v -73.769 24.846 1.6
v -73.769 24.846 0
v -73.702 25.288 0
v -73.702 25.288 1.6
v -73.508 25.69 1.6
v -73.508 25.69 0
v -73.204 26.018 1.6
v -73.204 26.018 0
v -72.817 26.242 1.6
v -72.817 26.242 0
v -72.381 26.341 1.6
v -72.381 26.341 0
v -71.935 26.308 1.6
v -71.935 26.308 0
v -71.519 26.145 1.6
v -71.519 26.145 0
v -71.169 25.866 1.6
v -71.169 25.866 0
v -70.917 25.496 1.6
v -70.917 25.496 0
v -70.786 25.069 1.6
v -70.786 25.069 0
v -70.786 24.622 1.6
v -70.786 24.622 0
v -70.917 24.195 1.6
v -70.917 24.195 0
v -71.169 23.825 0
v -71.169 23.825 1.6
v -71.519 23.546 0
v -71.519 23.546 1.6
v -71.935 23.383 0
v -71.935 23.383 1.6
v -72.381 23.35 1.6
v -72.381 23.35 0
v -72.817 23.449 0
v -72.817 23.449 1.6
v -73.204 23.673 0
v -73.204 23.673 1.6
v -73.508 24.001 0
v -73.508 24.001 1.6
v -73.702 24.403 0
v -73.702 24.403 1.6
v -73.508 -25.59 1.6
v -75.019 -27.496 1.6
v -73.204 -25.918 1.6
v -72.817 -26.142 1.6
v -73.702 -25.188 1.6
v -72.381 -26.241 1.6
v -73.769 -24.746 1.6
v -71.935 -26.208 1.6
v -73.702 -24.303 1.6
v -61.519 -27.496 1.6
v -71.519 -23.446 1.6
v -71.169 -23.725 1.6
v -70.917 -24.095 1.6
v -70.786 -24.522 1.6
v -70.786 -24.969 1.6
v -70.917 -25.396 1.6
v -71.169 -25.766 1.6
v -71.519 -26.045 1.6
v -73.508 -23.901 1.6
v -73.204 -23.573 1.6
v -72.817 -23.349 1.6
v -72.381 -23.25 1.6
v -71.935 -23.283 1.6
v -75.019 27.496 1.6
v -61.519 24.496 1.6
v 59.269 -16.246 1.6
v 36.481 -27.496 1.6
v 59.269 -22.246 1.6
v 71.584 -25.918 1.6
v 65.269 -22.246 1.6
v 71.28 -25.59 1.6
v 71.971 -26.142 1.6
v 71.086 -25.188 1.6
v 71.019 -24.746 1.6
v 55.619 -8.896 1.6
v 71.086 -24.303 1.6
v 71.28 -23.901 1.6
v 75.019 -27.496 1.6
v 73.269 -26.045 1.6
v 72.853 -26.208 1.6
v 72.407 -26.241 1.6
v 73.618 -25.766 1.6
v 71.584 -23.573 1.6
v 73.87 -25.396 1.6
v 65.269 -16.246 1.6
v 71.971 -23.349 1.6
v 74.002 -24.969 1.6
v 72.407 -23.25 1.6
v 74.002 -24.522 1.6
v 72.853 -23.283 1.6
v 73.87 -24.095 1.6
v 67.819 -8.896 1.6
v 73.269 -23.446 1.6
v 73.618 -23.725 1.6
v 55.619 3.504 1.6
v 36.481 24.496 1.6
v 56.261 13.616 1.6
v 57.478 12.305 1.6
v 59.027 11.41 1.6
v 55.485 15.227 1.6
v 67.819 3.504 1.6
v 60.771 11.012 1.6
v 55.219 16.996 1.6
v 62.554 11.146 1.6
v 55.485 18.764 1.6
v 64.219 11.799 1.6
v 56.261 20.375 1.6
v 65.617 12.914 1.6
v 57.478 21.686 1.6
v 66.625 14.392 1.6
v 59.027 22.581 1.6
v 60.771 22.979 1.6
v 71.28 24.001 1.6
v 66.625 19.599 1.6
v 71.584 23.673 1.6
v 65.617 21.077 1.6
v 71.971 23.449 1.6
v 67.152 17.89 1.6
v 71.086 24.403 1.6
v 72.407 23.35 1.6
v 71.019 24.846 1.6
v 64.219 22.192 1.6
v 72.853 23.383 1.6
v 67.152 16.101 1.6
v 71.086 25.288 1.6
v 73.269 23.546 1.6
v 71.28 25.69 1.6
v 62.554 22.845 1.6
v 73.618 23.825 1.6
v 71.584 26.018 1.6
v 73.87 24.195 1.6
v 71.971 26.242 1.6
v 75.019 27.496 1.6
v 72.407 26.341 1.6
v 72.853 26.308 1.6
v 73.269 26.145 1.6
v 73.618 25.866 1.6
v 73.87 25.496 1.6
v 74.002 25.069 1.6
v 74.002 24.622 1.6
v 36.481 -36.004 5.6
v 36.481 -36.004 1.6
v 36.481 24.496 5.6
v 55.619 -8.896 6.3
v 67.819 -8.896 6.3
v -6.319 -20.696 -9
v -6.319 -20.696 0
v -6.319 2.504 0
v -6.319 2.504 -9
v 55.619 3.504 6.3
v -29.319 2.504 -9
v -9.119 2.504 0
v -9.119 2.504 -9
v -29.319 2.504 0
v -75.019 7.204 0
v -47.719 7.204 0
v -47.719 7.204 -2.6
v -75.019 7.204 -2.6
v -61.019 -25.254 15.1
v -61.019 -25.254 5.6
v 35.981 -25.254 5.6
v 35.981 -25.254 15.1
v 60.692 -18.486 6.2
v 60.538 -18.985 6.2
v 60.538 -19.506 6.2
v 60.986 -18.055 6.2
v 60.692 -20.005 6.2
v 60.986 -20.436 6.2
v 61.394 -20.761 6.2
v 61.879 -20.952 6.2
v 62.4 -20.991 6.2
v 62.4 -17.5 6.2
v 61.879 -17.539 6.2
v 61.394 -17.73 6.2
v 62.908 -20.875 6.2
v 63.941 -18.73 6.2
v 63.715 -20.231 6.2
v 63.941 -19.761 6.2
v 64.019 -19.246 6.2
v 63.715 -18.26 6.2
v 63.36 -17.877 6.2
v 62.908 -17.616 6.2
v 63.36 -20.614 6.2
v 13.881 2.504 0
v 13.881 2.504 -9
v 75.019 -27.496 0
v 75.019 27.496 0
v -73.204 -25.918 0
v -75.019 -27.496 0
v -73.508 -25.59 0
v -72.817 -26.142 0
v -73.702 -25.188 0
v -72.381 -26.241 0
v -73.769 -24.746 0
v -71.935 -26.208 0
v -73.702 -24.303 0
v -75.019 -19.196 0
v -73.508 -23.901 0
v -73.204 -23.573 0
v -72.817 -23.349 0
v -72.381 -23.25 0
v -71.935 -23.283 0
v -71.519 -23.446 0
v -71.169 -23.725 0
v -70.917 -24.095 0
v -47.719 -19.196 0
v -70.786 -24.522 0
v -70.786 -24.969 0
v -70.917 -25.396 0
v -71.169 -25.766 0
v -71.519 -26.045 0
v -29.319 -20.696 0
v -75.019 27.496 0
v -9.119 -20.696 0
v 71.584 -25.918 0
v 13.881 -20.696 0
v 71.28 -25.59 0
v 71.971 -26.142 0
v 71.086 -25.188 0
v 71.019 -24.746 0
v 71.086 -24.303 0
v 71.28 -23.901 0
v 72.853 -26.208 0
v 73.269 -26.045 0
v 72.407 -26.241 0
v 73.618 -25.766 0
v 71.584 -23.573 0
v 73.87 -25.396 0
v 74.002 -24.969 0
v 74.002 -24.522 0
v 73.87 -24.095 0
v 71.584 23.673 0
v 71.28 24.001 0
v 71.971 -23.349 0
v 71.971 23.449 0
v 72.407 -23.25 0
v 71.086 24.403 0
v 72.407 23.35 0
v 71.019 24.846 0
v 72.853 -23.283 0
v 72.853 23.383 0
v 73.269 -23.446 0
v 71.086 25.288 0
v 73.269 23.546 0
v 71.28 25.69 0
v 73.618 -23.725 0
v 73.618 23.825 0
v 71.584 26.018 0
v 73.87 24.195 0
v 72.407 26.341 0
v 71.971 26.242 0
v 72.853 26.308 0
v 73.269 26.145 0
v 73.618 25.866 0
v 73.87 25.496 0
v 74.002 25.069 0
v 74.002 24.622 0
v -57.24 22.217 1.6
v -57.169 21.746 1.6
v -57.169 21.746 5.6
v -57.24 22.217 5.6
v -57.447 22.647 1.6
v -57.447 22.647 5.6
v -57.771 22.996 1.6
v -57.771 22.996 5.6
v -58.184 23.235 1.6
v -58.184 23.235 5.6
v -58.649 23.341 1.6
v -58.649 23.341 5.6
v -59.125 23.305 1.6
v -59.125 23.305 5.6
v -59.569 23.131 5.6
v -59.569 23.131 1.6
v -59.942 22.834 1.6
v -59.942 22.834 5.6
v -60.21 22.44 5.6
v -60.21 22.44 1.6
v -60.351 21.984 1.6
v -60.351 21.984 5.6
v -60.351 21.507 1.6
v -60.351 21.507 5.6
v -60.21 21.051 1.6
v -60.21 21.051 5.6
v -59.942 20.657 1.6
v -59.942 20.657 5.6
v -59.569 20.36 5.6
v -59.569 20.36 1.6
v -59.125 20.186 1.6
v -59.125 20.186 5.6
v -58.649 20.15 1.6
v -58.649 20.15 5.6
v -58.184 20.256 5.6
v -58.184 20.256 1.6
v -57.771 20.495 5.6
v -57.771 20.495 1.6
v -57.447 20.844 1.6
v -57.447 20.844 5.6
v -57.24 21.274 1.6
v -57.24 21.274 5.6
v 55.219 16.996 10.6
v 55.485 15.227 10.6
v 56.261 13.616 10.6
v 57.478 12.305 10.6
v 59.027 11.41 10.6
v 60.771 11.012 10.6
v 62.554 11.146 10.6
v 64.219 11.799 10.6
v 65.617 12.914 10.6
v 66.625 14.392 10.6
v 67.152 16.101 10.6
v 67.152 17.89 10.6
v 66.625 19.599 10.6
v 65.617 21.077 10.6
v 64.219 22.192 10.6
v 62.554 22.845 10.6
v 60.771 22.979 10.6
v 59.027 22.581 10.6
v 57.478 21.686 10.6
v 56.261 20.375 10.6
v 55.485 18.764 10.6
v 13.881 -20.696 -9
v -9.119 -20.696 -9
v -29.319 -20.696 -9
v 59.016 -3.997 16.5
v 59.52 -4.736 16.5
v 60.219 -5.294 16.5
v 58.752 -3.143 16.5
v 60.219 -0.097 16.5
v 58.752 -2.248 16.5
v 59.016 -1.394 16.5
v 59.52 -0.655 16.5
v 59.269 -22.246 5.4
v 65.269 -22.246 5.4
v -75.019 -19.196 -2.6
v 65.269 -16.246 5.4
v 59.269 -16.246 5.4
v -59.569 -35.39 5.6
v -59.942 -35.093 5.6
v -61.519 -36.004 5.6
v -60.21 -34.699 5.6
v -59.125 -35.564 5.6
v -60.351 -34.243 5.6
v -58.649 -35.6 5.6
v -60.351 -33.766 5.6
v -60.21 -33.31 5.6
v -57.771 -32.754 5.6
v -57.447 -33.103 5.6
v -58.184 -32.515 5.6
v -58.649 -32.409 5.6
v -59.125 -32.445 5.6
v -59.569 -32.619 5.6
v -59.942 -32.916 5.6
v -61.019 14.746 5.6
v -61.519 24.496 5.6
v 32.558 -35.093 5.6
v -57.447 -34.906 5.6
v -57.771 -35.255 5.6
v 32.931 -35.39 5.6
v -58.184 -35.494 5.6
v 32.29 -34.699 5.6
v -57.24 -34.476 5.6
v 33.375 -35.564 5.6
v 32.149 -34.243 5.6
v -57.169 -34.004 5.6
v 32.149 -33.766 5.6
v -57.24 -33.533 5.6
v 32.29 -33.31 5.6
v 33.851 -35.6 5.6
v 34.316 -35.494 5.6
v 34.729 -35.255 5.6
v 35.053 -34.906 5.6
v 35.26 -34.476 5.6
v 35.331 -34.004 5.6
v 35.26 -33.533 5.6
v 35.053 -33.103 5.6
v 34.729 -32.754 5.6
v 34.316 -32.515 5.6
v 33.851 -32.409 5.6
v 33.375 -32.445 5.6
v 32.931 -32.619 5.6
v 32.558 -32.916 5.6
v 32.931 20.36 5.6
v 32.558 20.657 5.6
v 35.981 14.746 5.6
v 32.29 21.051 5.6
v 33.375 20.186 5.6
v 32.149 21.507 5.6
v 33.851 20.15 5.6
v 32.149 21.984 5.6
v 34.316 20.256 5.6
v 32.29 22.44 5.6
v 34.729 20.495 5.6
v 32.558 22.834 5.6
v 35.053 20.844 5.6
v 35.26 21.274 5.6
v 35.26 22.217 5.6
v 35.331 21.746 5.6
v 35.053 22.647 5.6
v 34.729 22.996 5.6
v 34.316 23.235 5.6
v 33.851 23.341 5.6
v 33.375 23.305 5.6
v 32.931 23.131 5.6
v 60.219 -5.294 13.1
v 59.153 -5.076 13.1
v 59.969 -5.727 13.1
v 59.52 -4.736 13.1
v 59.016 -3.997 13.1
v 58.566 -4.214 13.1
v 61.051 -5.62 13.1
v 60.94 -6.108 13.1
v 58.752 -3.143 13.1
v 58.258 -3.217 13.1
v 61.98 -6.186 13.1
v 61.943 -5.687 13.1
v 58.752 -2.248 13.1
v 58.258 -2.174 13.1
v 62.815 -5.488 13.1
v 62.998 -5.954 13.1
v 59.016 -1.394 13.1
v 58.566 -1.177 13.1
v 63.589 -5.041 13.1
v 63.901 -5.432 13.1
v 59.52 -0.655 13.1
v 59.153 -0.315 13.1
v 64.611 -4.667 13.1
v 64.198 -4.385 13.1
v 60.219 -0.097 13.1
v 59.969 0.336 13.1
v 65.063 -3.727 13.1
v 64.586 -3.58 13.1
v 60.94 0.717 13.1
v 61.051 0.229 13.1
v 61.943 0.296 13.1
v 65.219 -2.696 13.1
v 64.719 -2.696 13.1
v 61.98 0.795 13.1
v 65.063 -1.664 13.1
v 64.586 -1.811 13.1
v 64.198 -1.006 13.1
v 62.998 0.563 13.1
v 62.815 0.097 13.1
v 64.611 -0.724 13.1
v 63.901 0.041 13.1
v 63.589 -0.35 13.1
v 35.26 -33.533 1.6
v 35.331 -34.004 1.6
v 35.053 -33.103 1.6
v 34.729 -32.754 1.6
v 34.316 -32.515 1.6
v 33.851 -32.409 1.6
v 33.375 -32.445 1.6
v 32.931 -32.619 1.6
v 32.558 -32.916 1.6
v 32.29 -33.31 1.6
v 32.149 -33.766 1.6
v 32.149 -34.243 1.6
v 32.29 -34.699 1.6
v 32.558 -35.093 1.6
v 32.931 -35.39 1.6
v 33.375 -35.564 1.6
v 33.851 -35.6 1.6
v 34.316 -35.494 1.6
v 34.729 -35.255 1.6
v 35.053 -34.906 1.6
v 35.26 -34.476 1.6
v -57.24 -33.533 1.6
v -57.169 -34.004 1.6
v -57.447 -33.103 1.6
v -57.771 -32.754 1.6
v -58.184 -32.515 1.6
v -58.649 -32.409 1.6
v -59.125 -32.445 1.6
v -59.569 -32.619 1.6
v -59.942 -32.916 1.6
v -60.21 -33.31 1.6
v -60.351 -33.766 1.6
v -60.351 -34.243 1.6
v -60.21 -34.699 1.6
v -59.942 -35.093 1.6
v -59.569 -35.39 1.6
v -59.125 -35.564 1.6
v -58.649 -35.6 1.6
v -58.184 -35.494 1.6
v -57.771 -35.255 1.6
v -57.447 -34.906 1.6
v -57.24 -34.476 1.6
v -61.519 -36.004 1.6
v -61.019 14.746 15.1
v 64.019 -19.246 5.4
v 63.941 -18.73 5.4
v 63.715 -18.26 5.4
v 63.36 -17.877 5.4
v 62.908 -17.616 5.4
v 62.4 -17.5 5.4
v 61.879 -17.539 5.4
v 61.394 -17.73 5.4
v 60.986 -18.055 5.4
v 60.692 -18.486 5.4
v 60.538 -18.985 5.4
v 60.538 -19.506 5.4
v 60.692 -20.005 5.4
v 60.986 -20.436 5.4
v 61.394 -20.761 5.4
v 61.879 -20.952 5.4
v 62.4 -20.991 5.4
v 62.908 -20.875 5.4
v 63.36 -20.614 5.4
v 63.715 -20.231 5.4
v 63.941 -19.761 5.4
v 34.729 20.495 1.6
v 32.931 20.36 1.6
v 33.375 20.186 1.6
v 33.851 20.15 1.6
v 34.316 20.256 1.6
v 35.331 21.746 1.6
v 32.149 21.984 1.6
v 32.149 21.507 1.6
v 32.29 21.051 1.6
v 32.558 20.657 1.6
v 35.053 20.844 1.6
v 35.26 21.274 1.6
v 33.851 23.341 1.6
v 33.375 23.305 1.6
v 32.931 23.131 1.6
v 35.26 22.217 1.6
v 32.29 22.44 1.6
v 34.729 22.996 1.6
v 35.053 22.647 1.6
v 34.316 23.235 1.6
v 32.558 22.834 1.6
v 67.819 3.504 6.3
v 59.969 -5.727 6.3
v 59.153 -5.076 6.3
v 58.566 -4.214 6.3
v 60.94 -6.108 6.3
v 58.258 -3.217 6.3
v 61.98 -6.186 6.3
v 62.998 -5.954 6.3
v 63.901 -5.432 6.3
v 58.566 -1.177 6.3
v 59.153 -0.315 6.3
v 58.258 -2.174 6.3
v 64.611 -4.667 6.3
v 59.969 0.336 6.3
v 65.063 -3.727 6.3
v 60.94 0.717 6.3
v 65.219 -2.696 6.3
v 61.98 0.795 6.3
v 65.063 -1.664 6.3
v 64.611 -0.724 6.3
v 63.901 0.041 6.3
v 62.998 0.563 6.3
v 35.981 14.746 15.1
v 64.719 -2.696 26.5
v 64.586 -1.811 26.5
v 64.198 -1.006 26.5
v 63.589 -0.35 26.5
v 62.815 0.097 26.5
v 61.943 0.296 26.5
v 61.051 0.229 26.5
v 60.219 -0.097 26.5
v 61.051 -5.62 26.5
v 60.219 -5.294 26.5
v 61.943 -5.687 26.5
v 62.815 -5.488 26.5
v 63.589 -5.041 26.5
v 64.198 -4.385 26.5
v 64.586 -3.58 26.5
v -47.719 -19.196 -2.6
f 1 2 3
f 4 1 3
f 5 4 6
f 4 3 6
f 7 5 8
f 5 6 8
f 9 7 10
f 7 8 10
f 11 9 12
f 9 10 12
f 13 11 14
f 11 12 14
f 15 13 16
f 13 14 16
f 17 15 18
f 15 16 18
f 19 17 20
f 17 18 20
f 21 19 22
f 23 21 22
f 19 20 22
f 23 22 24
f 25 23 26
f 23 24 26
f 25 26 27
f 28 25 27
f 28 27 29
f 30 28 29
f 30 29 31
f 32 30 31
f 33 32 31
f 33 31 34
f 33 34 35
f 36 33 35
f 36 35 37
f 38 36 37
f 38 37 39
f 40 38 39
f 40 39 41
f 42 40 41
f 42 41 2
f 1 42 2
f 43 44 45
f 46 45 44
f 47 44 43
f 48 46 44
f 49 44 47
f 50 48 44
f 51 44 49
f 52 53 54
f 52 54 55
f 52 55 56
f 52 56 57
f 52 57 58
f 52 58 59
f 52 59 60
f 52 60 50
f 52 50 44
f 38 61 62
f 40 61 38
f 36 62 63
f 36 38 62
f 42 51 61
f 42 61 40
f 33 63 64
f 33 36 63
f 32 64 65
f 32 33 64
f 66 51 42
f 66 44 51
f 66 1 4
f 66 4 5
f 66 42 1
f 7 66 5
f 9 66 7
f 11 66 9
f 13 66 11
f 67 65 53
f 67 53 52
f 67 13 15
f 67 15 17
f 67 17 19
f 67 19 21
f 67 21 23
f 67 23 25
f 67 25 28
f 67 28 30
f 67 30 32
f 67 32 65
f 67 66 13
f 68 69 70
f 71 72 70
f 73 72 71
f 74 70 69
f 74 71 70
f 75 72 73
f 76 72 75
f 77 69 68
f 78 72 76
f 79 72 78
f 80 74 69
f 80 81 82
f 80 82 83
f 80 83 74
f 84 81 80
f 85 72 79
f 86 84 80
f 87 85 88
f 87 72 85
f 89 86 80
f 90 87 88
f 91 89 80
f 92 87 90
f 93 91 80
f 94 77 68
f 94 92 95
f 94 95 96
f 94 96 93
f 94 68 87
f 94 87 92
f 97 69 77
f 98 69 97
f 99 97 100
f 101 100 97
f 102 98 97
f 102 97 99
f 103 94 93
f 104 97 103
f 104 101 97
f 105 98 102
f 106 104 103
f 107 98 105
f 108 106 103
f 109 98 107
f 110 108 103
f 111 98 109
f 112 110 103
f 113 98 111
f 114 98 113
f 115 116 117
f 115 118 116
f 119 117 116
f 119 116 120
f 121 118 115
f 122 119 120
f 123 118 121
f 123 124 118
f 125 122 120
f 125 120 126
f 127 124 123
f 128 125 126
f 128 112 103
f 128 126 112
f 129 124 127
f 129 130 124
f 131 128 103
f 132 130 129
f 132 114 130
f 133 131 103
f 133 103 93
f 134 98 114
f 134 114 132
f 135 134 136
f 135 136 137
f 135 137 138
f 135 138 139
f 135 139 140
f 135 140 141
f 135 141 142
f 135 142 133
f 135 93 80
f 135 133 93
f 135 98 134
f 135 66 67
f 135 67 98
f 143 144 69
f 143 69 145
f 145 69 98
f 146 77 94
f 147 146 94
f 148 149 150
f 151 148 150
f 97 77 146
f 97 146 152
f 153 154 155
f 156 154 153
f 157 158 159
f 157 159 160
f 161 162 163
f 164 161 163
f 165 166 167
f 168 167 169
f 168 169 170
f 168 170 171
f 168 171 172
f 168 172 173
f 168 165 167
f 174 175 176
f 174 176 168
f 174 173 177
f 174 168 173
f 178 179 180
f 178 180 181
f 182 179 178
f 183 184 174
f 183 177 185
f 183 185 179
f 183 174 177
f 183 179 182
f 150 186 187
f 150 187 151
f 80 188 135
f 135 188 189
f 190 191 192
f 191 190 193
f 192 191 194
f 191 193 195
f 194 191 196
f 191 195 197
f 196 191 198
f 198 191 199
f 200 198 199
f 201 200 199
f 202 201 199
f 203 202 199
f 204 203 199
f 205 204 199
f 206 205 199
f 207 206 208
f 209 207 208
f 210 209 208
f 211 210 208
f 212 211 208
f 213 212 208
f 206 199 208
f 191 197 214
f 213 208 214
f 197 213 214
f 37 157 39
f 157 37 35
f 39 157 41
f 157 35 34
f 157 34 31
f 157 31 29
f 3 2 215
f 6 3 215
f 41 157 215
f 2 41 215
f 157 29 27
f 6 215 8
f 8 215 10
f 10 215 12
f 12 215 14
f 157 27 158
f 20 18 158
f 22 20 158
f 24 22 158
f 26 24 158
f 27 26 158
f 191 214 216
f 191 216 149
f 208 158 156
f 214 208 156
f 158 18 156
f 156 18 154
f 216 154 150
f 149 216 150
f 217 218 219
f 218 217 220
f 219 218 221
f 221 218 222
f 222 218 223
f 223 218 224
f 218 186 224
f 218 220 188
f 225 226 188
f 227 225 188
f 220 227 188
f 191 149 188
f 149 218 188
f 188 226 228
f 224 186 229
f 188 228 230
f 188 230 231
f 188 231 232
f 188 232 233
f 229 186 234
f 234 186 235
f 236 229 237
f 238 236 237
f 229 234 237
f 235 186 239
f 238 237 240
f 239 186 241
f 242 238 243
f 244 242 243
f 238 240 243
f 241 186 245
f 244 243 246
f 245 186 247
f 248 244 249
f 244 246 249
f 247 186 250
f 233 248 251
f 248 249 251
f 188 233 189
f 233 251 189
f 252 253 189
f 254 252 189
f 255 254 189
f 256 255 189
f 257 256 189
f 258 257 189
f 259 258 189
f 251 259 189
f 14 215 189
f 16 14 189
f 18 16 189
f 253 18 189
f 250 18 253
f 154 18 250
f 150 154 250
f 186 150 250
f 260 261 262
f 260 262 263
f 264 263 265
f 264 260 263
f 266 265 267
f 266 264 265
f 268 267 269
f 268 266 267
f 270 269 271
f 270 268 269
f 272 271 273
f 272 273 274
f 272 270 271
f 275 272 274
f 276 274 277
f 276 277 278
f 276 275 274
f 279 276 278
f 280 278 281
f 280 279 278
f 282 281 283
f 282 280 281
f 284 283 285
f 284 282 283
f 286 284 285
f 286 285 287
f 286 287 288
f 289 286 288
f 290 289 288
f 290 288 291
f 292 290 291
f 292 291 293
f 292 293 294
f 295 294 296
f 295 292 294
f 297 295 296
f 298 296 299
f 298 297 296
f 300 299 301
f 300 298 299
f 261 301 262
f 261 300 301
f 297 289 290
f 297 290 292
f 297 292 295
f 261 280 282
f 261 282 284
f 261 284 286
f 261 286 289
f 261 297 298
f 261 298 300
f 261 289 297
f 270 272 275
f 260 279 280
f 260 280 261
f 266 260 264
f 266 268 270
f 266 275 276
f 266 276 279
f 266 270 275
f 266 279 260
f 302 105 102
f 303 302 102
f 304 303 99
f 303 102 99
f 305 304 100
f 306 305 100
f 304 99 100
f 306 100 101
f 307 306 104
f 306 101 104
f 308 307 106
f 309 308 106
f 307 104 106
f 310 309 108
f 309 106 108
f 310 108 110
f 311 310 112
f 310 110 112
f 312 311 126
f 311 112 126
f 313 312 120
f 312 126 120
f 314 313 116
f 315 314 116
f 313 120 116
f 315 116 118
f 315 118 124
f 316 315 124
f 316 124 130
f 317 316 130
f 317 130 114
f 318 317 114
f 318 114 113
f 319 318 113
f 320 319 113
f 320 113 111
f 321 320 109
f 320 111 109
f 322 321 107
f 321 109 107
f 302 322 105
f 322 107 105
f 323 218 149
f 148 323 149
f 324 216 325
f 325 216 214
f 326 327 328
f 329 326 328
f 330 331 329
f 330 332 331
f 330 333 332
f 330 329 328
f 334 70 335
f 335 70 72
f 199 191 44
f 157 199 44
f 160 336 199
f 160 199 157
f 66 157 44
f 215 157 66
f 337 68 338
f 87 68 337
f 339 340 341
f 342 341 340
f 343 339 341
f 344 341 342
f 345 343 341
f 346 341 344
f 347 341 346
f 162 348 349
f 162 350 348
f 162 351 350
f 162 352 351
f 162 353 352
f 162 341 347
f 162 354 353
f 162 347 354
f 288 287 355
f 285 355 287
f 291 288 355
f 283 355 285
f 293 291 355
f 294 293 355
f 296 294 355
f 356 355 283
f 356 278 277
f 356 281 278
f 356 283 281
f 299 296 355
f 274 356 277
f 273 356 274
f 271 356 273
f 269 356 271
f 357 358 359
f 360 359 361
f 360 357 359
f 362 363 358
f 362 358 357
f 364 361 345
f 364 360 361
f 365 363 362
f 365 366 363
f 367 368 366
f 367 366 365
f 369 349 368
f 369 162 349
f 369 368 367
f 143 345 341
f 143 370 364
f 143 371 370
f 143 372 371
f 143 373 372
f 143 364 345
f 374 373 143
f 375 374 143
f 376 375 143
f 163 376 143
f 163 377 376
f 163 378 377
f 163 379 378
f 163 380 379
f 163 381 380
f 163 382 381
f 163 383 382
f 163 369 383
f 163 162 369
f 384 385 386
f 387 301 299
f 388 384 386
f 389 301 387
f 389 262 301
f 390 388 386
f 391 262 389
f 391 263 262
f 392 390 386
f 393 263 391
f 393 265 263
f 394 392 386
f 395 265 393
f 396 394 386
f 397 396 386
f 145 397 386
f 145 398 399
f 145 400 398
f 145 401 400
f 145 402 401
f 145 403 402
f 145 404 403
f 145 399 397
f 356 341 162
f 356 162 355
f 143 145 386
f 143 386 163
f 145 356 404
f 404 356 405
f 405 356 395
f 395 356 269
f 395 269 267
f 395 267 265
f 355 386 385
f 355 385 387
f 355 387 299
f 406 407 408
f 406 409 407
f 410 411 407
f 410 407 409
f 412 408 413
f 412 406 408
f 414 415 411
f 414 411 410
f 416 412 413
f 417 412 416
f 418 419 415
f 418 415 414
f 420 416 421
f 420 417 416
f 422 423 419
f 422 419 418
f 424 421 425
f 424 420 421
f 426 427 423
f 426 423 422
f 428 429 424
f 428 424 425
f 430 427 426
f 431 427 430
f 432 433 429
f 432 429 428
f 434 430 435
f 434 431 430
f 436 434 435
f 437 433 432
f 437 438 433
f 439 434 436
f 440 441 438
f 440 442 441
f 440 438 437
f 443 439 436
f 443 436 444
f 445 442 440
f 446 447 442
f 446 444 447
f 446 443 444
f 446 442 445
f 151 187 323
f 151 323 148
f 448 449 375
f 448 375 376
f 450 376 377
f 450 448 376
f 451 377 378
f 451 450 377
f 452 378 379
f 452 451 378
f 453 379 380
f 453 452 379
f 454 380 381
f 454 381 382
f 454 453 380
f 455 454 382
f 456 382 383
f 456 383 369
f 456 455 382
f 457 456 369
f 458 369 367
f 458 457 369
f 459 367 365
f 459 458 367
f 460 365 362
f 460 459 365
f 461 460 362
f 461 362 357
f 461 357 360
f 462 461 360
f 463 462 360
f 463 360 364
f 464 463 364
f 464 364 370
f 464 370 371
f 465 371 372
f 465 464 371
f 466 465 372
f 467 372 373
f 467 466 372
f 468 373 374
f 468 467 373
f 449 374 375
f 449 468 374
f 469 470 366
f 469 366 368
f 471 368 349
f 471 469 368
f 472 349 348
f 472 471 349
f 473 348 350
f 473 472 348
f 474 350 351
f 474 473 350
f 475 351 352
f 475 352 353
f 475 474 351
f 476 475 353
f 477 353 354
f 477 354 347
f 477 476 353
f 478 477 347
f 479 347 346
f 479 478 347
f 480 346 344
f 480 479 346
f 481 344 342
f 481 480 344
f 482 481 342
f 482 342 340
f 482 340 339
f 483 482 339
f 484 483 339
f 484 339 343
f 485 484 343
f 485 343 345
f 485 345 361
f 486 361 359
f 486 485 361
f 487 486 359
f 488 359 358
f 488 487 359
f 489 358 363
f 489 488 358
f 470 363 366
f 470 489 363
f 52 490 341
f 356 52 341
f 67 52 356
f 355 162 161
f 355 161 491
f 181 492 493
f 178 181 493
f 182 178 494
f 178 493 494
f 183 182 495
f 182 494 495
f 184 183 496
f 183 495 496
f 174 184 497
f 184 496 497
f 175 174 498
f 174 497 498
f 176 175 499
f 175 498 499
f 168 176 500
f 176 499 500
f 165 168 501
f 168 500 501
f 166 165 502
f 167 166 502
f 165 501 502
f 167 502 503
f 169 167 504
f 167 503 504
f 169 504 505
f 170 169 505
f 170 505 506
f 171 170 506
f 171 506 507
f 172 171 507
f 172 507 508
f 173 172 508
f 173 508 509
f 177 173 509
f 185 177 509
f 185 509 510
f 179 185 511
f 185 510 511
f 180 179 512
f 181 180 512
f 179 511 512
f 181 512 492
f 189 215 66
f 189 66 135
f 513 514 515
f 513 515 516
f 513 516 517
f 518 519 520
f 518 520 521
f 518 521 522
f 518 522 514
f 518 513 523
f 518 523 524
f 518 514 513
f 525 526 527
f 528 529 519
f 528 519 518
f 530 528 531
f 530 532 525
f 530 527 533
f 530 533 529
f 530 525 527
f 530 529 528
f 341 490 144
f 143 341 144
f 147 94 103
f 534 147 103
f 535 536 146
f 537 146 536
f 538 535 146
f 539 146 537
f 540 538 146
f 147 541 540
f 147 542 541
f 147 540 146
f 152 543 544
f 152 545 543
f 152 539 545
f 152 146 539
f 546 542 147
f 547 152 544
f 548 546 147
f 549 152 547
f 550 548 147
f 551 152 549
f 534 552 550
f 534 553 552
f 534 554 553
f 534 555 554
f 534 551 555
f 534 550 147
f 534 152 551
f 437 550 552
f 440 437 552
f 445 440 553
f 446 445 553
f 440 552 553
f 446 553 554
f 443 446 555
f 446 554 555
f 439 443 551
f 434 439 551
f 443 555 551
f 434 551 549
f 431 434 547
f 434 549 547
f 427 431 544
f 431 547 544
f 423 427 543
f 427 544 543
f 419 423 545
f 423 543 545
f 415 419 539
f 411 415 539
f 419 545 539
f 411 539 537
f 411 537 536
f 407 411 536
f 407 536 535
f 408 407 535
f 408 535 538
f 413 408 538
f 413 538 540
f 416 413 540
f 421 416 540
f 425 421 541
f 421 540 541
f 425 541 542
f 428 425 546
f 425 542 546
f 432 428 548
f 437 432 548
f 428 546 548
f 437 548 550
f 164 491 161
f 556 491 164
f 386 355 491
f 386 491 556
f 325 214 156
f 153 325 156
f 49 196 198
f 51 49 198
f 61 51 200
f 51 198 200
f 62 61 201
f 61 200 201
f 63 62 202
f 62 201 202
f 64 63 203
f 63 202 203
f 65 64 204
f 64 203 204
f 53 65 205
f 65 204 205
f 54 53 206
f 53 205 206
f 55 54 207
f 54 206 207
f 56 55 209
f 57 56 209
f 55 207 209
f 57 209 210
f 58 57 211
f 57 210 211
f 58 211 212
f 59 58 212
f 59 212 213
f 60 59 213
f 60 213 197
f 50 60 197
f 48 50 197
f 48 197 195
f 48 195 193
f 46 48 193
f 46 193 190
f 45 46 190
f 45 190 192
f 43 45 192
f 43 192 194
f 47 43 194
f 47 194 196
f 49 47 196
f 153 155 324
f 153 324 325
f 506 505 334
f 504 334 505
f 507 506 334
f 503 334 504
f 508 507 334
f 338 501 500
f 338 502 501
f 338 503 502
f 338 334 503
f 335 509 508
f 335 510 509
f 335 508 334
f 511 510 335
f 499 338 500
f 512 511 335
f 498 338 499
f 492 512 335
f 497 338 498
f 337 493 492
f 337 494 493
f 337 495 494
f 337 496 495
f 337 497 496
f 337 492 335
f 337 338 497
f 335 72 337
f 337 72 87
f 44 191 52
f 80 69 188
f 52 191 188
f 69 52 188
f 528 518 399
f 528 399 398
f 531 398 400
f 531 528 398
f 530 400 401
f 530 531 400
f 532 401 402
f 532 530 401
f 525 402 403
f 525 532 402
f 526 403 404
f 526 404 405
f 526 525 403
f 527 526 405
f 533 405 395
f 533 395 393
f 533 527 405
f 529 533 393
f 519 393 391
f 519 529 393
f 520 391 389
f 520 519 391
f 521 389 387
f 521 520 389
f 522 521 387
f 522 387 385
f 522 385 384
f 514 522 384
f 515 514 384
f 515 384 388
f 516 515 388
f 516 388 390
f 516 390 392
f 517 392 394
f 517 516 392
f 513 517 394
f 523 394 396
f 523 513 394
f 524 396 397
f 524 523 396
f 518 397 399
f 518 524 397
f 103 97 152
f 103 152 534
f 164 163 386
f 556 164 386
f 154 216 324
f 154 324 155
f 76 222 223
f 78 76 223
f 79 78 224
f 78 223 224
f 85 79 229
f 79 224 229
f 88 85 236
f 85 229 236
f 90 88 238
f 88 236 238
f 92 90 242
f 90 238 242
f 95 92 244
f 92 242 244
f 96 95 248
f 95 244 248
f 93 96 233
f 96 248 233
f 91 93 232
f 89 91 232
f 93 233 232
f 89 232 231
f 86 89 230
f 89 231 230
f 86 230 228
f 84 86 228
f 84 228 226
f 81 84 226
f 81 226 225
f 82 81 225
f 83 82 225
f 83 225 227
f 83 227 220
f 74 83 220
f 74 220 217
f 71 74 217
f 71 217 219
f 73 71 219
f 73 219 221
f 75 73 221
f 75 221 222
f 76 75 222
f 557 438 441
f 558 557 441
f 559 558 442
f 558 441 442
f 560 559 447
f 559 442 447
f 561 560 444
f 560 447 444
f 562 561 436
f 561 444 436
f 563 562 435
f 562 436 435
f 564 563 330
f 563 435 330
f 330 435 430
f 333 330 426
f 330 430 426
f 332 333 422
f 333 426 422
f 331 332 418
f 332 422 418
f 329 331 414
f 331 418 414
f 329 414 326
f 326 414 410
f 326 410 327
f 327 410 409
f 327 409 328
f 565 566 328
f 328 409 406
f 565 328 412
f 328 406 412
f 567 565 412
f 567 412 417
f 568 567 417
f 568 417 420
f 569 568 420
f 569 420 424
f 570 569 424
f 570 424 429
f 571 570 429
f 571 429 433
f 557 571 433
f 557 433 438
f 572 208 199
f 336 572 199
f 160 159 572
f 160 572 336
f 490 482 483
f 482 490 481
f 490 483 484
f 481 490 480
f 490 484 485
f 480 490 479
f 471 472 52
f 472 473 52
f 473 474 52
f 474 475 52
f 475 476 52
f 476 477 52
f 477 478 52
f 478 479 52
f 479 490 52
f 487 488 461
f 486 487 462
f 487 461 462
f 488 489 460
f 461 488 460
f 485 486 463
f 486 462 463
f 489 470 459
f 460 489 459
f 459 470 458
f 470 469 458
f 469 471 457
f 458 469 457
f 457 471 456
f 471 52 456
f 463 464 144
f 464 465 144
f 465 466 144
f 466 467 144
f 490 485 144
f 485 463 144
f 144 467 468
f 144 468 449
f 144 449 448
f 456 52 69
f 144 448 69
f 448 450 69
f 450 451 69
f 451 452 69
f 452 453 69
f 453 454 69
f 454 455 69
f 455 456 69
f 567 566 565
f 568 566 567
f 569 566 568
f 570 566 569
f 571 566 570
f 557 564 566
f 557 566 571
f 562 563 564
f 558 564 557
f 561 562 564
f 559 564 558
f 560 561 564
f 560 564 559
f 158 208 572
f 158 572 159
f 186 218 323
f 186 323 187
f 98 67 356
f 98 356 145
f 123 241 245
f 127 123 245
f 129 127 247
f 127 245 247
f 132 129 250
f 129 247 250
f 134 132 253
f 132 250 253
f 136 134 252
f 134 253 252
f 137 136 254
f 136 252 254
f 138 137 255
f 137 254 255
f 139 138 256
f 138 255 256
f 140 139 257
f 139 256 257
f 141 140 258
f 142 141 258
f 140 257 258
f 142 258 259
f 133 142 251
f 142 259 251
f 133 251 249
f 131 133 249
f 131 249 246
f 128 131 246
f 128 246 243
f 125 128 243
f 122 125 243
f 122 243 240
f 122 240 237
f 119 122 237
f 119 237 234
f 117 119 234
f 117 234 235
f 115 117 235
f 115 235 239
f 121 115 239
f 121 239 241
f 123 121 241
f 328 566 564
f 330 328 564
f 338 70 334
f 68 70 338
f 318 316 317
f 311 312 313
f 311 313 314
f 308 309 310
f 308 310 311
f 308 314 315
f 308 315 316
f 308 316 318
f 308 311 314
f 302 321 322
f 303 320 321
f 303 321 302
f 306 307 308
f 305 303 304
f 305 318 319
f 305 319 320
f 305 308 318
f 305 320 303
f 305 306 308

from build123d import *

# Parameters (mm, degrees)
SKETCH1_W                          = 150.0378
SKETCH1_H                          = 54.991
BOSS_EXTRUDE1_DEPTH                = 1.6002
SKETCH2_W                          = 98
SKETCH2_H                          = 60.5
BOSS_EXTRUDE2_DEPTH                = 4
SKETCH3_W                          = 97
SKETCH3_H                          = 40
BOSS_EXTRUDE3_DEPTH                = 9.5
SKETCH4_R                          = 6
BOSS_EXTRUDE4_DEPTH                = 9
SKETCH5_W                          = 12.2
SKETCH5_H                          = 12.4
BOSS_EXTRUDE5_DEPTH                = 4.7
SKETCH6_R                          = 3.5
BOSS_EXTRUDE6_DEPTH                = 6.8
SKETCH7_R                          = 3
BOSS_EXTRUDE7_DEPTH                = 13.4
SKETCH8_W                          = 1.5
SKETCH8_H                          = 5.196152422
CUT_EXTRUDE1_DEPTH                 = 10
SKETCH9_W                          = 6
SKETCH9_H                          = 6
BOSS_EXTRUDE8_DEPTH                = 3.8
SKETCH10_R                         = 1.75
BOSS_EXTRUDE9_DEPTH                = 0.8
SKETCH11_W                         = 27.3
SKETCH11_H                         = 26.4
BOSS_EXTRUDE10_DEPTH               = 2.6
SKETCH12_W                         = 20.2
SKETCH12_H                         = 23.2
BOSS_EXTRUDE11_DEPTH               = 9
F_3_0_3_DIAMETER_HOLE1_D           = 3
F_3_2_START                        = 1.6002
F_3_2_3_2_DIAMETER_HOLE1_OUTLINE_R = 1.6
F_3_2_3_2_DIAMETER_HOLE1_DEPTH     = 4


# Read off the part's stored shape, not the designer's step: Ø3.2 (3.2) Diameter Hole1
with BuildPart() as part:
    # Sketch1 → Boss-Extrude1 (new body)
    with BuildSketch(Plane.XY):
        Rectangle(SKETCH1_W, SKETCH1_H)
    extrude(amount=BOSS_EXTRUDE1_DEPTH)

    # Sketch2 → Boss-Extrude2 (add)
    with BuildSketch(Plane.XY.offset(1.6002)):
        with Locations((-12.5189, -5.7545)):
            Rectangle(SKETCH2_W, SKETCH2_H)
    extrude(amount=BOSS_EXTRUDE2_DEPTH)

    # Sketch3 → Boss-Extrude3 (add)
    with BuildSketch(Plane.XY.offset(5.6002)):
        with Locations((-12.5189, -5.2545)):
            Rectangle(SKETCH3_W, SKETCH3_H)
    extrude(amount=BOSS_EXTRUDE3_DEPTH)

    # Sketch4 → Boss-Extrude4 (add)
    with BuildSketch(Plane.XY.offset(1.6002)):
        with Locations(Location((61.2189, 16.9955, 0), (0, 0, 180))):
            Circle(SKETCH4_R)
    extrude(amount=BOSS_EXTRUDE4_DEPTH)

    # Sketch5 → Boss-Extrude5 (add)
    with BuildSketch(Plane.XY.offset(1.6002)):
        with Locations((61.7189, -2.6955)):
            Rectangle(SKETCH5_W, SKETCH5_H)
    extrude(amount=BOSS_EXTRUDE5_DEPTH)

    # Sketch6 → Boss-Extrude6 (add)
    with BuildSketch(Plane.XY.offset(6.3002)):
        with Locations((61.7189, -2.6955)):
            Circle(SKETCH6_R)
    extrude(amount=BOSS_EXTRUDE6_DEPTH)

    # Sketch7 → Boss-Extrude7 (add)
    with BuildSketch(Plane.XY.offset(13.1002)):
        with Locations((61.7189, -2.6955)):
            Circle(SKETCH7_R)
    extrude(amount=BOSS_EXTRUDE7_DEPTH)

    # Sketch8 → Cut-Extrude1 (cut)
    with BuildSketch(Plane.XY.offset(26.5002)):
        with Locations((59.4689, -2.6955)):
            Rectangle(SKETCH8_W, SKETCH8_H)
    extrude(amount=-CUT_EXTRUDE1_DEPTH, mode=Mode.SUBTRACT)

    # Sketch9 → Boss-Extrude8 (add)
    with BuildSketch(Plane.XY.offset(1.6002)):
        with Locations((62.2689, -19.2455)):
            Rectangle(SKETCH9_W, SKETCH9_H)
    extrude(amount=BOSS_EXTRUDE8_DEPTH)

    # Sketch10 → Boss-Extrude9 (add)
    with BuildSketch(Plane.XY.offset(5.4002)):
        with Locations((62.2689, -19.2455)):
            Circle(SKETCH10_R)
    extrude(amount=BOSS_EXTRUDE9_DEPTH)

    # Sketch11 → Boss-Extrude10 (add)
    with BuildSketch(Plane(origin=(0, 0, 0), x_dir=(-1, 0, 0), z_dir=(0, 0, -1))):
        with Locations((61.3689, -5.9955)):
            Rectangle(SKETCH11_W, SKETCH11_H)
    extrude(amount=BOSS_EXTRUDE10_DEPTH)

    # Sketch12 → Boss-Extrude11 (add)
    with BuildSketch(Plane(origin=(0, 0, 0), x_dir=(-1, 0, 0), z_dir=(0, 0, -1))):
        with Locations((19.2189, -9.0955)):
            Rectangle(SKETCH12_W, SKETCH12_H)
        with Locations((-3.7811, -9.0955)):
            Rectangle(SKETCH12_W, SKETCH12_H)
    extrude(amount=BOSS_EXTRUDE11_DEPTH)

    # Ø3.0 (3) Diameter Hole1 (through all)
    with Locations(Plane.XY.offset(1.6002)):
        with Locations((-72.2689, 24.8455), (-72.2689, -24.7455), (72.5189, -24.7455), (72.5189, 24.8455)):
            Hole(F_3_0_3_DIAMETER_HOLE1_D / 2)

    # Ø3.2 (3.2) Diameter Hole1 outline → Ø3.2 (3.2) Diameter Hole1 (cut)
    with BuildSketch(Plane.XY.offset(F_3_2_START)):
        with Locations((-58.7689, -34.0045)):
            Circle(F_3_2_3_2_DIAMETER_HOLE1_OUTLINE_R)
        with Locations((33.7311, -34.0045)):
            Circle(F_3_2_3_2_DIAMETER_HOLE1_OUTLINE_R)
        with Locations((33.7311, 21.7455)):
            Circle(F_3_2_3_2_DIAMETER_HOLE1_OUTLINE_R)
        with Locations((-58.7689, 21.7455)):
            Circle(F_3_2_3_2_DIAMETER_HOLE1_OUTLINE_R)
    extrude(amount=F_3_2_3_2_DIAMETER_HOLE1_DEPTH, mode=Mode.SUBTRACT)


solid = part.part
